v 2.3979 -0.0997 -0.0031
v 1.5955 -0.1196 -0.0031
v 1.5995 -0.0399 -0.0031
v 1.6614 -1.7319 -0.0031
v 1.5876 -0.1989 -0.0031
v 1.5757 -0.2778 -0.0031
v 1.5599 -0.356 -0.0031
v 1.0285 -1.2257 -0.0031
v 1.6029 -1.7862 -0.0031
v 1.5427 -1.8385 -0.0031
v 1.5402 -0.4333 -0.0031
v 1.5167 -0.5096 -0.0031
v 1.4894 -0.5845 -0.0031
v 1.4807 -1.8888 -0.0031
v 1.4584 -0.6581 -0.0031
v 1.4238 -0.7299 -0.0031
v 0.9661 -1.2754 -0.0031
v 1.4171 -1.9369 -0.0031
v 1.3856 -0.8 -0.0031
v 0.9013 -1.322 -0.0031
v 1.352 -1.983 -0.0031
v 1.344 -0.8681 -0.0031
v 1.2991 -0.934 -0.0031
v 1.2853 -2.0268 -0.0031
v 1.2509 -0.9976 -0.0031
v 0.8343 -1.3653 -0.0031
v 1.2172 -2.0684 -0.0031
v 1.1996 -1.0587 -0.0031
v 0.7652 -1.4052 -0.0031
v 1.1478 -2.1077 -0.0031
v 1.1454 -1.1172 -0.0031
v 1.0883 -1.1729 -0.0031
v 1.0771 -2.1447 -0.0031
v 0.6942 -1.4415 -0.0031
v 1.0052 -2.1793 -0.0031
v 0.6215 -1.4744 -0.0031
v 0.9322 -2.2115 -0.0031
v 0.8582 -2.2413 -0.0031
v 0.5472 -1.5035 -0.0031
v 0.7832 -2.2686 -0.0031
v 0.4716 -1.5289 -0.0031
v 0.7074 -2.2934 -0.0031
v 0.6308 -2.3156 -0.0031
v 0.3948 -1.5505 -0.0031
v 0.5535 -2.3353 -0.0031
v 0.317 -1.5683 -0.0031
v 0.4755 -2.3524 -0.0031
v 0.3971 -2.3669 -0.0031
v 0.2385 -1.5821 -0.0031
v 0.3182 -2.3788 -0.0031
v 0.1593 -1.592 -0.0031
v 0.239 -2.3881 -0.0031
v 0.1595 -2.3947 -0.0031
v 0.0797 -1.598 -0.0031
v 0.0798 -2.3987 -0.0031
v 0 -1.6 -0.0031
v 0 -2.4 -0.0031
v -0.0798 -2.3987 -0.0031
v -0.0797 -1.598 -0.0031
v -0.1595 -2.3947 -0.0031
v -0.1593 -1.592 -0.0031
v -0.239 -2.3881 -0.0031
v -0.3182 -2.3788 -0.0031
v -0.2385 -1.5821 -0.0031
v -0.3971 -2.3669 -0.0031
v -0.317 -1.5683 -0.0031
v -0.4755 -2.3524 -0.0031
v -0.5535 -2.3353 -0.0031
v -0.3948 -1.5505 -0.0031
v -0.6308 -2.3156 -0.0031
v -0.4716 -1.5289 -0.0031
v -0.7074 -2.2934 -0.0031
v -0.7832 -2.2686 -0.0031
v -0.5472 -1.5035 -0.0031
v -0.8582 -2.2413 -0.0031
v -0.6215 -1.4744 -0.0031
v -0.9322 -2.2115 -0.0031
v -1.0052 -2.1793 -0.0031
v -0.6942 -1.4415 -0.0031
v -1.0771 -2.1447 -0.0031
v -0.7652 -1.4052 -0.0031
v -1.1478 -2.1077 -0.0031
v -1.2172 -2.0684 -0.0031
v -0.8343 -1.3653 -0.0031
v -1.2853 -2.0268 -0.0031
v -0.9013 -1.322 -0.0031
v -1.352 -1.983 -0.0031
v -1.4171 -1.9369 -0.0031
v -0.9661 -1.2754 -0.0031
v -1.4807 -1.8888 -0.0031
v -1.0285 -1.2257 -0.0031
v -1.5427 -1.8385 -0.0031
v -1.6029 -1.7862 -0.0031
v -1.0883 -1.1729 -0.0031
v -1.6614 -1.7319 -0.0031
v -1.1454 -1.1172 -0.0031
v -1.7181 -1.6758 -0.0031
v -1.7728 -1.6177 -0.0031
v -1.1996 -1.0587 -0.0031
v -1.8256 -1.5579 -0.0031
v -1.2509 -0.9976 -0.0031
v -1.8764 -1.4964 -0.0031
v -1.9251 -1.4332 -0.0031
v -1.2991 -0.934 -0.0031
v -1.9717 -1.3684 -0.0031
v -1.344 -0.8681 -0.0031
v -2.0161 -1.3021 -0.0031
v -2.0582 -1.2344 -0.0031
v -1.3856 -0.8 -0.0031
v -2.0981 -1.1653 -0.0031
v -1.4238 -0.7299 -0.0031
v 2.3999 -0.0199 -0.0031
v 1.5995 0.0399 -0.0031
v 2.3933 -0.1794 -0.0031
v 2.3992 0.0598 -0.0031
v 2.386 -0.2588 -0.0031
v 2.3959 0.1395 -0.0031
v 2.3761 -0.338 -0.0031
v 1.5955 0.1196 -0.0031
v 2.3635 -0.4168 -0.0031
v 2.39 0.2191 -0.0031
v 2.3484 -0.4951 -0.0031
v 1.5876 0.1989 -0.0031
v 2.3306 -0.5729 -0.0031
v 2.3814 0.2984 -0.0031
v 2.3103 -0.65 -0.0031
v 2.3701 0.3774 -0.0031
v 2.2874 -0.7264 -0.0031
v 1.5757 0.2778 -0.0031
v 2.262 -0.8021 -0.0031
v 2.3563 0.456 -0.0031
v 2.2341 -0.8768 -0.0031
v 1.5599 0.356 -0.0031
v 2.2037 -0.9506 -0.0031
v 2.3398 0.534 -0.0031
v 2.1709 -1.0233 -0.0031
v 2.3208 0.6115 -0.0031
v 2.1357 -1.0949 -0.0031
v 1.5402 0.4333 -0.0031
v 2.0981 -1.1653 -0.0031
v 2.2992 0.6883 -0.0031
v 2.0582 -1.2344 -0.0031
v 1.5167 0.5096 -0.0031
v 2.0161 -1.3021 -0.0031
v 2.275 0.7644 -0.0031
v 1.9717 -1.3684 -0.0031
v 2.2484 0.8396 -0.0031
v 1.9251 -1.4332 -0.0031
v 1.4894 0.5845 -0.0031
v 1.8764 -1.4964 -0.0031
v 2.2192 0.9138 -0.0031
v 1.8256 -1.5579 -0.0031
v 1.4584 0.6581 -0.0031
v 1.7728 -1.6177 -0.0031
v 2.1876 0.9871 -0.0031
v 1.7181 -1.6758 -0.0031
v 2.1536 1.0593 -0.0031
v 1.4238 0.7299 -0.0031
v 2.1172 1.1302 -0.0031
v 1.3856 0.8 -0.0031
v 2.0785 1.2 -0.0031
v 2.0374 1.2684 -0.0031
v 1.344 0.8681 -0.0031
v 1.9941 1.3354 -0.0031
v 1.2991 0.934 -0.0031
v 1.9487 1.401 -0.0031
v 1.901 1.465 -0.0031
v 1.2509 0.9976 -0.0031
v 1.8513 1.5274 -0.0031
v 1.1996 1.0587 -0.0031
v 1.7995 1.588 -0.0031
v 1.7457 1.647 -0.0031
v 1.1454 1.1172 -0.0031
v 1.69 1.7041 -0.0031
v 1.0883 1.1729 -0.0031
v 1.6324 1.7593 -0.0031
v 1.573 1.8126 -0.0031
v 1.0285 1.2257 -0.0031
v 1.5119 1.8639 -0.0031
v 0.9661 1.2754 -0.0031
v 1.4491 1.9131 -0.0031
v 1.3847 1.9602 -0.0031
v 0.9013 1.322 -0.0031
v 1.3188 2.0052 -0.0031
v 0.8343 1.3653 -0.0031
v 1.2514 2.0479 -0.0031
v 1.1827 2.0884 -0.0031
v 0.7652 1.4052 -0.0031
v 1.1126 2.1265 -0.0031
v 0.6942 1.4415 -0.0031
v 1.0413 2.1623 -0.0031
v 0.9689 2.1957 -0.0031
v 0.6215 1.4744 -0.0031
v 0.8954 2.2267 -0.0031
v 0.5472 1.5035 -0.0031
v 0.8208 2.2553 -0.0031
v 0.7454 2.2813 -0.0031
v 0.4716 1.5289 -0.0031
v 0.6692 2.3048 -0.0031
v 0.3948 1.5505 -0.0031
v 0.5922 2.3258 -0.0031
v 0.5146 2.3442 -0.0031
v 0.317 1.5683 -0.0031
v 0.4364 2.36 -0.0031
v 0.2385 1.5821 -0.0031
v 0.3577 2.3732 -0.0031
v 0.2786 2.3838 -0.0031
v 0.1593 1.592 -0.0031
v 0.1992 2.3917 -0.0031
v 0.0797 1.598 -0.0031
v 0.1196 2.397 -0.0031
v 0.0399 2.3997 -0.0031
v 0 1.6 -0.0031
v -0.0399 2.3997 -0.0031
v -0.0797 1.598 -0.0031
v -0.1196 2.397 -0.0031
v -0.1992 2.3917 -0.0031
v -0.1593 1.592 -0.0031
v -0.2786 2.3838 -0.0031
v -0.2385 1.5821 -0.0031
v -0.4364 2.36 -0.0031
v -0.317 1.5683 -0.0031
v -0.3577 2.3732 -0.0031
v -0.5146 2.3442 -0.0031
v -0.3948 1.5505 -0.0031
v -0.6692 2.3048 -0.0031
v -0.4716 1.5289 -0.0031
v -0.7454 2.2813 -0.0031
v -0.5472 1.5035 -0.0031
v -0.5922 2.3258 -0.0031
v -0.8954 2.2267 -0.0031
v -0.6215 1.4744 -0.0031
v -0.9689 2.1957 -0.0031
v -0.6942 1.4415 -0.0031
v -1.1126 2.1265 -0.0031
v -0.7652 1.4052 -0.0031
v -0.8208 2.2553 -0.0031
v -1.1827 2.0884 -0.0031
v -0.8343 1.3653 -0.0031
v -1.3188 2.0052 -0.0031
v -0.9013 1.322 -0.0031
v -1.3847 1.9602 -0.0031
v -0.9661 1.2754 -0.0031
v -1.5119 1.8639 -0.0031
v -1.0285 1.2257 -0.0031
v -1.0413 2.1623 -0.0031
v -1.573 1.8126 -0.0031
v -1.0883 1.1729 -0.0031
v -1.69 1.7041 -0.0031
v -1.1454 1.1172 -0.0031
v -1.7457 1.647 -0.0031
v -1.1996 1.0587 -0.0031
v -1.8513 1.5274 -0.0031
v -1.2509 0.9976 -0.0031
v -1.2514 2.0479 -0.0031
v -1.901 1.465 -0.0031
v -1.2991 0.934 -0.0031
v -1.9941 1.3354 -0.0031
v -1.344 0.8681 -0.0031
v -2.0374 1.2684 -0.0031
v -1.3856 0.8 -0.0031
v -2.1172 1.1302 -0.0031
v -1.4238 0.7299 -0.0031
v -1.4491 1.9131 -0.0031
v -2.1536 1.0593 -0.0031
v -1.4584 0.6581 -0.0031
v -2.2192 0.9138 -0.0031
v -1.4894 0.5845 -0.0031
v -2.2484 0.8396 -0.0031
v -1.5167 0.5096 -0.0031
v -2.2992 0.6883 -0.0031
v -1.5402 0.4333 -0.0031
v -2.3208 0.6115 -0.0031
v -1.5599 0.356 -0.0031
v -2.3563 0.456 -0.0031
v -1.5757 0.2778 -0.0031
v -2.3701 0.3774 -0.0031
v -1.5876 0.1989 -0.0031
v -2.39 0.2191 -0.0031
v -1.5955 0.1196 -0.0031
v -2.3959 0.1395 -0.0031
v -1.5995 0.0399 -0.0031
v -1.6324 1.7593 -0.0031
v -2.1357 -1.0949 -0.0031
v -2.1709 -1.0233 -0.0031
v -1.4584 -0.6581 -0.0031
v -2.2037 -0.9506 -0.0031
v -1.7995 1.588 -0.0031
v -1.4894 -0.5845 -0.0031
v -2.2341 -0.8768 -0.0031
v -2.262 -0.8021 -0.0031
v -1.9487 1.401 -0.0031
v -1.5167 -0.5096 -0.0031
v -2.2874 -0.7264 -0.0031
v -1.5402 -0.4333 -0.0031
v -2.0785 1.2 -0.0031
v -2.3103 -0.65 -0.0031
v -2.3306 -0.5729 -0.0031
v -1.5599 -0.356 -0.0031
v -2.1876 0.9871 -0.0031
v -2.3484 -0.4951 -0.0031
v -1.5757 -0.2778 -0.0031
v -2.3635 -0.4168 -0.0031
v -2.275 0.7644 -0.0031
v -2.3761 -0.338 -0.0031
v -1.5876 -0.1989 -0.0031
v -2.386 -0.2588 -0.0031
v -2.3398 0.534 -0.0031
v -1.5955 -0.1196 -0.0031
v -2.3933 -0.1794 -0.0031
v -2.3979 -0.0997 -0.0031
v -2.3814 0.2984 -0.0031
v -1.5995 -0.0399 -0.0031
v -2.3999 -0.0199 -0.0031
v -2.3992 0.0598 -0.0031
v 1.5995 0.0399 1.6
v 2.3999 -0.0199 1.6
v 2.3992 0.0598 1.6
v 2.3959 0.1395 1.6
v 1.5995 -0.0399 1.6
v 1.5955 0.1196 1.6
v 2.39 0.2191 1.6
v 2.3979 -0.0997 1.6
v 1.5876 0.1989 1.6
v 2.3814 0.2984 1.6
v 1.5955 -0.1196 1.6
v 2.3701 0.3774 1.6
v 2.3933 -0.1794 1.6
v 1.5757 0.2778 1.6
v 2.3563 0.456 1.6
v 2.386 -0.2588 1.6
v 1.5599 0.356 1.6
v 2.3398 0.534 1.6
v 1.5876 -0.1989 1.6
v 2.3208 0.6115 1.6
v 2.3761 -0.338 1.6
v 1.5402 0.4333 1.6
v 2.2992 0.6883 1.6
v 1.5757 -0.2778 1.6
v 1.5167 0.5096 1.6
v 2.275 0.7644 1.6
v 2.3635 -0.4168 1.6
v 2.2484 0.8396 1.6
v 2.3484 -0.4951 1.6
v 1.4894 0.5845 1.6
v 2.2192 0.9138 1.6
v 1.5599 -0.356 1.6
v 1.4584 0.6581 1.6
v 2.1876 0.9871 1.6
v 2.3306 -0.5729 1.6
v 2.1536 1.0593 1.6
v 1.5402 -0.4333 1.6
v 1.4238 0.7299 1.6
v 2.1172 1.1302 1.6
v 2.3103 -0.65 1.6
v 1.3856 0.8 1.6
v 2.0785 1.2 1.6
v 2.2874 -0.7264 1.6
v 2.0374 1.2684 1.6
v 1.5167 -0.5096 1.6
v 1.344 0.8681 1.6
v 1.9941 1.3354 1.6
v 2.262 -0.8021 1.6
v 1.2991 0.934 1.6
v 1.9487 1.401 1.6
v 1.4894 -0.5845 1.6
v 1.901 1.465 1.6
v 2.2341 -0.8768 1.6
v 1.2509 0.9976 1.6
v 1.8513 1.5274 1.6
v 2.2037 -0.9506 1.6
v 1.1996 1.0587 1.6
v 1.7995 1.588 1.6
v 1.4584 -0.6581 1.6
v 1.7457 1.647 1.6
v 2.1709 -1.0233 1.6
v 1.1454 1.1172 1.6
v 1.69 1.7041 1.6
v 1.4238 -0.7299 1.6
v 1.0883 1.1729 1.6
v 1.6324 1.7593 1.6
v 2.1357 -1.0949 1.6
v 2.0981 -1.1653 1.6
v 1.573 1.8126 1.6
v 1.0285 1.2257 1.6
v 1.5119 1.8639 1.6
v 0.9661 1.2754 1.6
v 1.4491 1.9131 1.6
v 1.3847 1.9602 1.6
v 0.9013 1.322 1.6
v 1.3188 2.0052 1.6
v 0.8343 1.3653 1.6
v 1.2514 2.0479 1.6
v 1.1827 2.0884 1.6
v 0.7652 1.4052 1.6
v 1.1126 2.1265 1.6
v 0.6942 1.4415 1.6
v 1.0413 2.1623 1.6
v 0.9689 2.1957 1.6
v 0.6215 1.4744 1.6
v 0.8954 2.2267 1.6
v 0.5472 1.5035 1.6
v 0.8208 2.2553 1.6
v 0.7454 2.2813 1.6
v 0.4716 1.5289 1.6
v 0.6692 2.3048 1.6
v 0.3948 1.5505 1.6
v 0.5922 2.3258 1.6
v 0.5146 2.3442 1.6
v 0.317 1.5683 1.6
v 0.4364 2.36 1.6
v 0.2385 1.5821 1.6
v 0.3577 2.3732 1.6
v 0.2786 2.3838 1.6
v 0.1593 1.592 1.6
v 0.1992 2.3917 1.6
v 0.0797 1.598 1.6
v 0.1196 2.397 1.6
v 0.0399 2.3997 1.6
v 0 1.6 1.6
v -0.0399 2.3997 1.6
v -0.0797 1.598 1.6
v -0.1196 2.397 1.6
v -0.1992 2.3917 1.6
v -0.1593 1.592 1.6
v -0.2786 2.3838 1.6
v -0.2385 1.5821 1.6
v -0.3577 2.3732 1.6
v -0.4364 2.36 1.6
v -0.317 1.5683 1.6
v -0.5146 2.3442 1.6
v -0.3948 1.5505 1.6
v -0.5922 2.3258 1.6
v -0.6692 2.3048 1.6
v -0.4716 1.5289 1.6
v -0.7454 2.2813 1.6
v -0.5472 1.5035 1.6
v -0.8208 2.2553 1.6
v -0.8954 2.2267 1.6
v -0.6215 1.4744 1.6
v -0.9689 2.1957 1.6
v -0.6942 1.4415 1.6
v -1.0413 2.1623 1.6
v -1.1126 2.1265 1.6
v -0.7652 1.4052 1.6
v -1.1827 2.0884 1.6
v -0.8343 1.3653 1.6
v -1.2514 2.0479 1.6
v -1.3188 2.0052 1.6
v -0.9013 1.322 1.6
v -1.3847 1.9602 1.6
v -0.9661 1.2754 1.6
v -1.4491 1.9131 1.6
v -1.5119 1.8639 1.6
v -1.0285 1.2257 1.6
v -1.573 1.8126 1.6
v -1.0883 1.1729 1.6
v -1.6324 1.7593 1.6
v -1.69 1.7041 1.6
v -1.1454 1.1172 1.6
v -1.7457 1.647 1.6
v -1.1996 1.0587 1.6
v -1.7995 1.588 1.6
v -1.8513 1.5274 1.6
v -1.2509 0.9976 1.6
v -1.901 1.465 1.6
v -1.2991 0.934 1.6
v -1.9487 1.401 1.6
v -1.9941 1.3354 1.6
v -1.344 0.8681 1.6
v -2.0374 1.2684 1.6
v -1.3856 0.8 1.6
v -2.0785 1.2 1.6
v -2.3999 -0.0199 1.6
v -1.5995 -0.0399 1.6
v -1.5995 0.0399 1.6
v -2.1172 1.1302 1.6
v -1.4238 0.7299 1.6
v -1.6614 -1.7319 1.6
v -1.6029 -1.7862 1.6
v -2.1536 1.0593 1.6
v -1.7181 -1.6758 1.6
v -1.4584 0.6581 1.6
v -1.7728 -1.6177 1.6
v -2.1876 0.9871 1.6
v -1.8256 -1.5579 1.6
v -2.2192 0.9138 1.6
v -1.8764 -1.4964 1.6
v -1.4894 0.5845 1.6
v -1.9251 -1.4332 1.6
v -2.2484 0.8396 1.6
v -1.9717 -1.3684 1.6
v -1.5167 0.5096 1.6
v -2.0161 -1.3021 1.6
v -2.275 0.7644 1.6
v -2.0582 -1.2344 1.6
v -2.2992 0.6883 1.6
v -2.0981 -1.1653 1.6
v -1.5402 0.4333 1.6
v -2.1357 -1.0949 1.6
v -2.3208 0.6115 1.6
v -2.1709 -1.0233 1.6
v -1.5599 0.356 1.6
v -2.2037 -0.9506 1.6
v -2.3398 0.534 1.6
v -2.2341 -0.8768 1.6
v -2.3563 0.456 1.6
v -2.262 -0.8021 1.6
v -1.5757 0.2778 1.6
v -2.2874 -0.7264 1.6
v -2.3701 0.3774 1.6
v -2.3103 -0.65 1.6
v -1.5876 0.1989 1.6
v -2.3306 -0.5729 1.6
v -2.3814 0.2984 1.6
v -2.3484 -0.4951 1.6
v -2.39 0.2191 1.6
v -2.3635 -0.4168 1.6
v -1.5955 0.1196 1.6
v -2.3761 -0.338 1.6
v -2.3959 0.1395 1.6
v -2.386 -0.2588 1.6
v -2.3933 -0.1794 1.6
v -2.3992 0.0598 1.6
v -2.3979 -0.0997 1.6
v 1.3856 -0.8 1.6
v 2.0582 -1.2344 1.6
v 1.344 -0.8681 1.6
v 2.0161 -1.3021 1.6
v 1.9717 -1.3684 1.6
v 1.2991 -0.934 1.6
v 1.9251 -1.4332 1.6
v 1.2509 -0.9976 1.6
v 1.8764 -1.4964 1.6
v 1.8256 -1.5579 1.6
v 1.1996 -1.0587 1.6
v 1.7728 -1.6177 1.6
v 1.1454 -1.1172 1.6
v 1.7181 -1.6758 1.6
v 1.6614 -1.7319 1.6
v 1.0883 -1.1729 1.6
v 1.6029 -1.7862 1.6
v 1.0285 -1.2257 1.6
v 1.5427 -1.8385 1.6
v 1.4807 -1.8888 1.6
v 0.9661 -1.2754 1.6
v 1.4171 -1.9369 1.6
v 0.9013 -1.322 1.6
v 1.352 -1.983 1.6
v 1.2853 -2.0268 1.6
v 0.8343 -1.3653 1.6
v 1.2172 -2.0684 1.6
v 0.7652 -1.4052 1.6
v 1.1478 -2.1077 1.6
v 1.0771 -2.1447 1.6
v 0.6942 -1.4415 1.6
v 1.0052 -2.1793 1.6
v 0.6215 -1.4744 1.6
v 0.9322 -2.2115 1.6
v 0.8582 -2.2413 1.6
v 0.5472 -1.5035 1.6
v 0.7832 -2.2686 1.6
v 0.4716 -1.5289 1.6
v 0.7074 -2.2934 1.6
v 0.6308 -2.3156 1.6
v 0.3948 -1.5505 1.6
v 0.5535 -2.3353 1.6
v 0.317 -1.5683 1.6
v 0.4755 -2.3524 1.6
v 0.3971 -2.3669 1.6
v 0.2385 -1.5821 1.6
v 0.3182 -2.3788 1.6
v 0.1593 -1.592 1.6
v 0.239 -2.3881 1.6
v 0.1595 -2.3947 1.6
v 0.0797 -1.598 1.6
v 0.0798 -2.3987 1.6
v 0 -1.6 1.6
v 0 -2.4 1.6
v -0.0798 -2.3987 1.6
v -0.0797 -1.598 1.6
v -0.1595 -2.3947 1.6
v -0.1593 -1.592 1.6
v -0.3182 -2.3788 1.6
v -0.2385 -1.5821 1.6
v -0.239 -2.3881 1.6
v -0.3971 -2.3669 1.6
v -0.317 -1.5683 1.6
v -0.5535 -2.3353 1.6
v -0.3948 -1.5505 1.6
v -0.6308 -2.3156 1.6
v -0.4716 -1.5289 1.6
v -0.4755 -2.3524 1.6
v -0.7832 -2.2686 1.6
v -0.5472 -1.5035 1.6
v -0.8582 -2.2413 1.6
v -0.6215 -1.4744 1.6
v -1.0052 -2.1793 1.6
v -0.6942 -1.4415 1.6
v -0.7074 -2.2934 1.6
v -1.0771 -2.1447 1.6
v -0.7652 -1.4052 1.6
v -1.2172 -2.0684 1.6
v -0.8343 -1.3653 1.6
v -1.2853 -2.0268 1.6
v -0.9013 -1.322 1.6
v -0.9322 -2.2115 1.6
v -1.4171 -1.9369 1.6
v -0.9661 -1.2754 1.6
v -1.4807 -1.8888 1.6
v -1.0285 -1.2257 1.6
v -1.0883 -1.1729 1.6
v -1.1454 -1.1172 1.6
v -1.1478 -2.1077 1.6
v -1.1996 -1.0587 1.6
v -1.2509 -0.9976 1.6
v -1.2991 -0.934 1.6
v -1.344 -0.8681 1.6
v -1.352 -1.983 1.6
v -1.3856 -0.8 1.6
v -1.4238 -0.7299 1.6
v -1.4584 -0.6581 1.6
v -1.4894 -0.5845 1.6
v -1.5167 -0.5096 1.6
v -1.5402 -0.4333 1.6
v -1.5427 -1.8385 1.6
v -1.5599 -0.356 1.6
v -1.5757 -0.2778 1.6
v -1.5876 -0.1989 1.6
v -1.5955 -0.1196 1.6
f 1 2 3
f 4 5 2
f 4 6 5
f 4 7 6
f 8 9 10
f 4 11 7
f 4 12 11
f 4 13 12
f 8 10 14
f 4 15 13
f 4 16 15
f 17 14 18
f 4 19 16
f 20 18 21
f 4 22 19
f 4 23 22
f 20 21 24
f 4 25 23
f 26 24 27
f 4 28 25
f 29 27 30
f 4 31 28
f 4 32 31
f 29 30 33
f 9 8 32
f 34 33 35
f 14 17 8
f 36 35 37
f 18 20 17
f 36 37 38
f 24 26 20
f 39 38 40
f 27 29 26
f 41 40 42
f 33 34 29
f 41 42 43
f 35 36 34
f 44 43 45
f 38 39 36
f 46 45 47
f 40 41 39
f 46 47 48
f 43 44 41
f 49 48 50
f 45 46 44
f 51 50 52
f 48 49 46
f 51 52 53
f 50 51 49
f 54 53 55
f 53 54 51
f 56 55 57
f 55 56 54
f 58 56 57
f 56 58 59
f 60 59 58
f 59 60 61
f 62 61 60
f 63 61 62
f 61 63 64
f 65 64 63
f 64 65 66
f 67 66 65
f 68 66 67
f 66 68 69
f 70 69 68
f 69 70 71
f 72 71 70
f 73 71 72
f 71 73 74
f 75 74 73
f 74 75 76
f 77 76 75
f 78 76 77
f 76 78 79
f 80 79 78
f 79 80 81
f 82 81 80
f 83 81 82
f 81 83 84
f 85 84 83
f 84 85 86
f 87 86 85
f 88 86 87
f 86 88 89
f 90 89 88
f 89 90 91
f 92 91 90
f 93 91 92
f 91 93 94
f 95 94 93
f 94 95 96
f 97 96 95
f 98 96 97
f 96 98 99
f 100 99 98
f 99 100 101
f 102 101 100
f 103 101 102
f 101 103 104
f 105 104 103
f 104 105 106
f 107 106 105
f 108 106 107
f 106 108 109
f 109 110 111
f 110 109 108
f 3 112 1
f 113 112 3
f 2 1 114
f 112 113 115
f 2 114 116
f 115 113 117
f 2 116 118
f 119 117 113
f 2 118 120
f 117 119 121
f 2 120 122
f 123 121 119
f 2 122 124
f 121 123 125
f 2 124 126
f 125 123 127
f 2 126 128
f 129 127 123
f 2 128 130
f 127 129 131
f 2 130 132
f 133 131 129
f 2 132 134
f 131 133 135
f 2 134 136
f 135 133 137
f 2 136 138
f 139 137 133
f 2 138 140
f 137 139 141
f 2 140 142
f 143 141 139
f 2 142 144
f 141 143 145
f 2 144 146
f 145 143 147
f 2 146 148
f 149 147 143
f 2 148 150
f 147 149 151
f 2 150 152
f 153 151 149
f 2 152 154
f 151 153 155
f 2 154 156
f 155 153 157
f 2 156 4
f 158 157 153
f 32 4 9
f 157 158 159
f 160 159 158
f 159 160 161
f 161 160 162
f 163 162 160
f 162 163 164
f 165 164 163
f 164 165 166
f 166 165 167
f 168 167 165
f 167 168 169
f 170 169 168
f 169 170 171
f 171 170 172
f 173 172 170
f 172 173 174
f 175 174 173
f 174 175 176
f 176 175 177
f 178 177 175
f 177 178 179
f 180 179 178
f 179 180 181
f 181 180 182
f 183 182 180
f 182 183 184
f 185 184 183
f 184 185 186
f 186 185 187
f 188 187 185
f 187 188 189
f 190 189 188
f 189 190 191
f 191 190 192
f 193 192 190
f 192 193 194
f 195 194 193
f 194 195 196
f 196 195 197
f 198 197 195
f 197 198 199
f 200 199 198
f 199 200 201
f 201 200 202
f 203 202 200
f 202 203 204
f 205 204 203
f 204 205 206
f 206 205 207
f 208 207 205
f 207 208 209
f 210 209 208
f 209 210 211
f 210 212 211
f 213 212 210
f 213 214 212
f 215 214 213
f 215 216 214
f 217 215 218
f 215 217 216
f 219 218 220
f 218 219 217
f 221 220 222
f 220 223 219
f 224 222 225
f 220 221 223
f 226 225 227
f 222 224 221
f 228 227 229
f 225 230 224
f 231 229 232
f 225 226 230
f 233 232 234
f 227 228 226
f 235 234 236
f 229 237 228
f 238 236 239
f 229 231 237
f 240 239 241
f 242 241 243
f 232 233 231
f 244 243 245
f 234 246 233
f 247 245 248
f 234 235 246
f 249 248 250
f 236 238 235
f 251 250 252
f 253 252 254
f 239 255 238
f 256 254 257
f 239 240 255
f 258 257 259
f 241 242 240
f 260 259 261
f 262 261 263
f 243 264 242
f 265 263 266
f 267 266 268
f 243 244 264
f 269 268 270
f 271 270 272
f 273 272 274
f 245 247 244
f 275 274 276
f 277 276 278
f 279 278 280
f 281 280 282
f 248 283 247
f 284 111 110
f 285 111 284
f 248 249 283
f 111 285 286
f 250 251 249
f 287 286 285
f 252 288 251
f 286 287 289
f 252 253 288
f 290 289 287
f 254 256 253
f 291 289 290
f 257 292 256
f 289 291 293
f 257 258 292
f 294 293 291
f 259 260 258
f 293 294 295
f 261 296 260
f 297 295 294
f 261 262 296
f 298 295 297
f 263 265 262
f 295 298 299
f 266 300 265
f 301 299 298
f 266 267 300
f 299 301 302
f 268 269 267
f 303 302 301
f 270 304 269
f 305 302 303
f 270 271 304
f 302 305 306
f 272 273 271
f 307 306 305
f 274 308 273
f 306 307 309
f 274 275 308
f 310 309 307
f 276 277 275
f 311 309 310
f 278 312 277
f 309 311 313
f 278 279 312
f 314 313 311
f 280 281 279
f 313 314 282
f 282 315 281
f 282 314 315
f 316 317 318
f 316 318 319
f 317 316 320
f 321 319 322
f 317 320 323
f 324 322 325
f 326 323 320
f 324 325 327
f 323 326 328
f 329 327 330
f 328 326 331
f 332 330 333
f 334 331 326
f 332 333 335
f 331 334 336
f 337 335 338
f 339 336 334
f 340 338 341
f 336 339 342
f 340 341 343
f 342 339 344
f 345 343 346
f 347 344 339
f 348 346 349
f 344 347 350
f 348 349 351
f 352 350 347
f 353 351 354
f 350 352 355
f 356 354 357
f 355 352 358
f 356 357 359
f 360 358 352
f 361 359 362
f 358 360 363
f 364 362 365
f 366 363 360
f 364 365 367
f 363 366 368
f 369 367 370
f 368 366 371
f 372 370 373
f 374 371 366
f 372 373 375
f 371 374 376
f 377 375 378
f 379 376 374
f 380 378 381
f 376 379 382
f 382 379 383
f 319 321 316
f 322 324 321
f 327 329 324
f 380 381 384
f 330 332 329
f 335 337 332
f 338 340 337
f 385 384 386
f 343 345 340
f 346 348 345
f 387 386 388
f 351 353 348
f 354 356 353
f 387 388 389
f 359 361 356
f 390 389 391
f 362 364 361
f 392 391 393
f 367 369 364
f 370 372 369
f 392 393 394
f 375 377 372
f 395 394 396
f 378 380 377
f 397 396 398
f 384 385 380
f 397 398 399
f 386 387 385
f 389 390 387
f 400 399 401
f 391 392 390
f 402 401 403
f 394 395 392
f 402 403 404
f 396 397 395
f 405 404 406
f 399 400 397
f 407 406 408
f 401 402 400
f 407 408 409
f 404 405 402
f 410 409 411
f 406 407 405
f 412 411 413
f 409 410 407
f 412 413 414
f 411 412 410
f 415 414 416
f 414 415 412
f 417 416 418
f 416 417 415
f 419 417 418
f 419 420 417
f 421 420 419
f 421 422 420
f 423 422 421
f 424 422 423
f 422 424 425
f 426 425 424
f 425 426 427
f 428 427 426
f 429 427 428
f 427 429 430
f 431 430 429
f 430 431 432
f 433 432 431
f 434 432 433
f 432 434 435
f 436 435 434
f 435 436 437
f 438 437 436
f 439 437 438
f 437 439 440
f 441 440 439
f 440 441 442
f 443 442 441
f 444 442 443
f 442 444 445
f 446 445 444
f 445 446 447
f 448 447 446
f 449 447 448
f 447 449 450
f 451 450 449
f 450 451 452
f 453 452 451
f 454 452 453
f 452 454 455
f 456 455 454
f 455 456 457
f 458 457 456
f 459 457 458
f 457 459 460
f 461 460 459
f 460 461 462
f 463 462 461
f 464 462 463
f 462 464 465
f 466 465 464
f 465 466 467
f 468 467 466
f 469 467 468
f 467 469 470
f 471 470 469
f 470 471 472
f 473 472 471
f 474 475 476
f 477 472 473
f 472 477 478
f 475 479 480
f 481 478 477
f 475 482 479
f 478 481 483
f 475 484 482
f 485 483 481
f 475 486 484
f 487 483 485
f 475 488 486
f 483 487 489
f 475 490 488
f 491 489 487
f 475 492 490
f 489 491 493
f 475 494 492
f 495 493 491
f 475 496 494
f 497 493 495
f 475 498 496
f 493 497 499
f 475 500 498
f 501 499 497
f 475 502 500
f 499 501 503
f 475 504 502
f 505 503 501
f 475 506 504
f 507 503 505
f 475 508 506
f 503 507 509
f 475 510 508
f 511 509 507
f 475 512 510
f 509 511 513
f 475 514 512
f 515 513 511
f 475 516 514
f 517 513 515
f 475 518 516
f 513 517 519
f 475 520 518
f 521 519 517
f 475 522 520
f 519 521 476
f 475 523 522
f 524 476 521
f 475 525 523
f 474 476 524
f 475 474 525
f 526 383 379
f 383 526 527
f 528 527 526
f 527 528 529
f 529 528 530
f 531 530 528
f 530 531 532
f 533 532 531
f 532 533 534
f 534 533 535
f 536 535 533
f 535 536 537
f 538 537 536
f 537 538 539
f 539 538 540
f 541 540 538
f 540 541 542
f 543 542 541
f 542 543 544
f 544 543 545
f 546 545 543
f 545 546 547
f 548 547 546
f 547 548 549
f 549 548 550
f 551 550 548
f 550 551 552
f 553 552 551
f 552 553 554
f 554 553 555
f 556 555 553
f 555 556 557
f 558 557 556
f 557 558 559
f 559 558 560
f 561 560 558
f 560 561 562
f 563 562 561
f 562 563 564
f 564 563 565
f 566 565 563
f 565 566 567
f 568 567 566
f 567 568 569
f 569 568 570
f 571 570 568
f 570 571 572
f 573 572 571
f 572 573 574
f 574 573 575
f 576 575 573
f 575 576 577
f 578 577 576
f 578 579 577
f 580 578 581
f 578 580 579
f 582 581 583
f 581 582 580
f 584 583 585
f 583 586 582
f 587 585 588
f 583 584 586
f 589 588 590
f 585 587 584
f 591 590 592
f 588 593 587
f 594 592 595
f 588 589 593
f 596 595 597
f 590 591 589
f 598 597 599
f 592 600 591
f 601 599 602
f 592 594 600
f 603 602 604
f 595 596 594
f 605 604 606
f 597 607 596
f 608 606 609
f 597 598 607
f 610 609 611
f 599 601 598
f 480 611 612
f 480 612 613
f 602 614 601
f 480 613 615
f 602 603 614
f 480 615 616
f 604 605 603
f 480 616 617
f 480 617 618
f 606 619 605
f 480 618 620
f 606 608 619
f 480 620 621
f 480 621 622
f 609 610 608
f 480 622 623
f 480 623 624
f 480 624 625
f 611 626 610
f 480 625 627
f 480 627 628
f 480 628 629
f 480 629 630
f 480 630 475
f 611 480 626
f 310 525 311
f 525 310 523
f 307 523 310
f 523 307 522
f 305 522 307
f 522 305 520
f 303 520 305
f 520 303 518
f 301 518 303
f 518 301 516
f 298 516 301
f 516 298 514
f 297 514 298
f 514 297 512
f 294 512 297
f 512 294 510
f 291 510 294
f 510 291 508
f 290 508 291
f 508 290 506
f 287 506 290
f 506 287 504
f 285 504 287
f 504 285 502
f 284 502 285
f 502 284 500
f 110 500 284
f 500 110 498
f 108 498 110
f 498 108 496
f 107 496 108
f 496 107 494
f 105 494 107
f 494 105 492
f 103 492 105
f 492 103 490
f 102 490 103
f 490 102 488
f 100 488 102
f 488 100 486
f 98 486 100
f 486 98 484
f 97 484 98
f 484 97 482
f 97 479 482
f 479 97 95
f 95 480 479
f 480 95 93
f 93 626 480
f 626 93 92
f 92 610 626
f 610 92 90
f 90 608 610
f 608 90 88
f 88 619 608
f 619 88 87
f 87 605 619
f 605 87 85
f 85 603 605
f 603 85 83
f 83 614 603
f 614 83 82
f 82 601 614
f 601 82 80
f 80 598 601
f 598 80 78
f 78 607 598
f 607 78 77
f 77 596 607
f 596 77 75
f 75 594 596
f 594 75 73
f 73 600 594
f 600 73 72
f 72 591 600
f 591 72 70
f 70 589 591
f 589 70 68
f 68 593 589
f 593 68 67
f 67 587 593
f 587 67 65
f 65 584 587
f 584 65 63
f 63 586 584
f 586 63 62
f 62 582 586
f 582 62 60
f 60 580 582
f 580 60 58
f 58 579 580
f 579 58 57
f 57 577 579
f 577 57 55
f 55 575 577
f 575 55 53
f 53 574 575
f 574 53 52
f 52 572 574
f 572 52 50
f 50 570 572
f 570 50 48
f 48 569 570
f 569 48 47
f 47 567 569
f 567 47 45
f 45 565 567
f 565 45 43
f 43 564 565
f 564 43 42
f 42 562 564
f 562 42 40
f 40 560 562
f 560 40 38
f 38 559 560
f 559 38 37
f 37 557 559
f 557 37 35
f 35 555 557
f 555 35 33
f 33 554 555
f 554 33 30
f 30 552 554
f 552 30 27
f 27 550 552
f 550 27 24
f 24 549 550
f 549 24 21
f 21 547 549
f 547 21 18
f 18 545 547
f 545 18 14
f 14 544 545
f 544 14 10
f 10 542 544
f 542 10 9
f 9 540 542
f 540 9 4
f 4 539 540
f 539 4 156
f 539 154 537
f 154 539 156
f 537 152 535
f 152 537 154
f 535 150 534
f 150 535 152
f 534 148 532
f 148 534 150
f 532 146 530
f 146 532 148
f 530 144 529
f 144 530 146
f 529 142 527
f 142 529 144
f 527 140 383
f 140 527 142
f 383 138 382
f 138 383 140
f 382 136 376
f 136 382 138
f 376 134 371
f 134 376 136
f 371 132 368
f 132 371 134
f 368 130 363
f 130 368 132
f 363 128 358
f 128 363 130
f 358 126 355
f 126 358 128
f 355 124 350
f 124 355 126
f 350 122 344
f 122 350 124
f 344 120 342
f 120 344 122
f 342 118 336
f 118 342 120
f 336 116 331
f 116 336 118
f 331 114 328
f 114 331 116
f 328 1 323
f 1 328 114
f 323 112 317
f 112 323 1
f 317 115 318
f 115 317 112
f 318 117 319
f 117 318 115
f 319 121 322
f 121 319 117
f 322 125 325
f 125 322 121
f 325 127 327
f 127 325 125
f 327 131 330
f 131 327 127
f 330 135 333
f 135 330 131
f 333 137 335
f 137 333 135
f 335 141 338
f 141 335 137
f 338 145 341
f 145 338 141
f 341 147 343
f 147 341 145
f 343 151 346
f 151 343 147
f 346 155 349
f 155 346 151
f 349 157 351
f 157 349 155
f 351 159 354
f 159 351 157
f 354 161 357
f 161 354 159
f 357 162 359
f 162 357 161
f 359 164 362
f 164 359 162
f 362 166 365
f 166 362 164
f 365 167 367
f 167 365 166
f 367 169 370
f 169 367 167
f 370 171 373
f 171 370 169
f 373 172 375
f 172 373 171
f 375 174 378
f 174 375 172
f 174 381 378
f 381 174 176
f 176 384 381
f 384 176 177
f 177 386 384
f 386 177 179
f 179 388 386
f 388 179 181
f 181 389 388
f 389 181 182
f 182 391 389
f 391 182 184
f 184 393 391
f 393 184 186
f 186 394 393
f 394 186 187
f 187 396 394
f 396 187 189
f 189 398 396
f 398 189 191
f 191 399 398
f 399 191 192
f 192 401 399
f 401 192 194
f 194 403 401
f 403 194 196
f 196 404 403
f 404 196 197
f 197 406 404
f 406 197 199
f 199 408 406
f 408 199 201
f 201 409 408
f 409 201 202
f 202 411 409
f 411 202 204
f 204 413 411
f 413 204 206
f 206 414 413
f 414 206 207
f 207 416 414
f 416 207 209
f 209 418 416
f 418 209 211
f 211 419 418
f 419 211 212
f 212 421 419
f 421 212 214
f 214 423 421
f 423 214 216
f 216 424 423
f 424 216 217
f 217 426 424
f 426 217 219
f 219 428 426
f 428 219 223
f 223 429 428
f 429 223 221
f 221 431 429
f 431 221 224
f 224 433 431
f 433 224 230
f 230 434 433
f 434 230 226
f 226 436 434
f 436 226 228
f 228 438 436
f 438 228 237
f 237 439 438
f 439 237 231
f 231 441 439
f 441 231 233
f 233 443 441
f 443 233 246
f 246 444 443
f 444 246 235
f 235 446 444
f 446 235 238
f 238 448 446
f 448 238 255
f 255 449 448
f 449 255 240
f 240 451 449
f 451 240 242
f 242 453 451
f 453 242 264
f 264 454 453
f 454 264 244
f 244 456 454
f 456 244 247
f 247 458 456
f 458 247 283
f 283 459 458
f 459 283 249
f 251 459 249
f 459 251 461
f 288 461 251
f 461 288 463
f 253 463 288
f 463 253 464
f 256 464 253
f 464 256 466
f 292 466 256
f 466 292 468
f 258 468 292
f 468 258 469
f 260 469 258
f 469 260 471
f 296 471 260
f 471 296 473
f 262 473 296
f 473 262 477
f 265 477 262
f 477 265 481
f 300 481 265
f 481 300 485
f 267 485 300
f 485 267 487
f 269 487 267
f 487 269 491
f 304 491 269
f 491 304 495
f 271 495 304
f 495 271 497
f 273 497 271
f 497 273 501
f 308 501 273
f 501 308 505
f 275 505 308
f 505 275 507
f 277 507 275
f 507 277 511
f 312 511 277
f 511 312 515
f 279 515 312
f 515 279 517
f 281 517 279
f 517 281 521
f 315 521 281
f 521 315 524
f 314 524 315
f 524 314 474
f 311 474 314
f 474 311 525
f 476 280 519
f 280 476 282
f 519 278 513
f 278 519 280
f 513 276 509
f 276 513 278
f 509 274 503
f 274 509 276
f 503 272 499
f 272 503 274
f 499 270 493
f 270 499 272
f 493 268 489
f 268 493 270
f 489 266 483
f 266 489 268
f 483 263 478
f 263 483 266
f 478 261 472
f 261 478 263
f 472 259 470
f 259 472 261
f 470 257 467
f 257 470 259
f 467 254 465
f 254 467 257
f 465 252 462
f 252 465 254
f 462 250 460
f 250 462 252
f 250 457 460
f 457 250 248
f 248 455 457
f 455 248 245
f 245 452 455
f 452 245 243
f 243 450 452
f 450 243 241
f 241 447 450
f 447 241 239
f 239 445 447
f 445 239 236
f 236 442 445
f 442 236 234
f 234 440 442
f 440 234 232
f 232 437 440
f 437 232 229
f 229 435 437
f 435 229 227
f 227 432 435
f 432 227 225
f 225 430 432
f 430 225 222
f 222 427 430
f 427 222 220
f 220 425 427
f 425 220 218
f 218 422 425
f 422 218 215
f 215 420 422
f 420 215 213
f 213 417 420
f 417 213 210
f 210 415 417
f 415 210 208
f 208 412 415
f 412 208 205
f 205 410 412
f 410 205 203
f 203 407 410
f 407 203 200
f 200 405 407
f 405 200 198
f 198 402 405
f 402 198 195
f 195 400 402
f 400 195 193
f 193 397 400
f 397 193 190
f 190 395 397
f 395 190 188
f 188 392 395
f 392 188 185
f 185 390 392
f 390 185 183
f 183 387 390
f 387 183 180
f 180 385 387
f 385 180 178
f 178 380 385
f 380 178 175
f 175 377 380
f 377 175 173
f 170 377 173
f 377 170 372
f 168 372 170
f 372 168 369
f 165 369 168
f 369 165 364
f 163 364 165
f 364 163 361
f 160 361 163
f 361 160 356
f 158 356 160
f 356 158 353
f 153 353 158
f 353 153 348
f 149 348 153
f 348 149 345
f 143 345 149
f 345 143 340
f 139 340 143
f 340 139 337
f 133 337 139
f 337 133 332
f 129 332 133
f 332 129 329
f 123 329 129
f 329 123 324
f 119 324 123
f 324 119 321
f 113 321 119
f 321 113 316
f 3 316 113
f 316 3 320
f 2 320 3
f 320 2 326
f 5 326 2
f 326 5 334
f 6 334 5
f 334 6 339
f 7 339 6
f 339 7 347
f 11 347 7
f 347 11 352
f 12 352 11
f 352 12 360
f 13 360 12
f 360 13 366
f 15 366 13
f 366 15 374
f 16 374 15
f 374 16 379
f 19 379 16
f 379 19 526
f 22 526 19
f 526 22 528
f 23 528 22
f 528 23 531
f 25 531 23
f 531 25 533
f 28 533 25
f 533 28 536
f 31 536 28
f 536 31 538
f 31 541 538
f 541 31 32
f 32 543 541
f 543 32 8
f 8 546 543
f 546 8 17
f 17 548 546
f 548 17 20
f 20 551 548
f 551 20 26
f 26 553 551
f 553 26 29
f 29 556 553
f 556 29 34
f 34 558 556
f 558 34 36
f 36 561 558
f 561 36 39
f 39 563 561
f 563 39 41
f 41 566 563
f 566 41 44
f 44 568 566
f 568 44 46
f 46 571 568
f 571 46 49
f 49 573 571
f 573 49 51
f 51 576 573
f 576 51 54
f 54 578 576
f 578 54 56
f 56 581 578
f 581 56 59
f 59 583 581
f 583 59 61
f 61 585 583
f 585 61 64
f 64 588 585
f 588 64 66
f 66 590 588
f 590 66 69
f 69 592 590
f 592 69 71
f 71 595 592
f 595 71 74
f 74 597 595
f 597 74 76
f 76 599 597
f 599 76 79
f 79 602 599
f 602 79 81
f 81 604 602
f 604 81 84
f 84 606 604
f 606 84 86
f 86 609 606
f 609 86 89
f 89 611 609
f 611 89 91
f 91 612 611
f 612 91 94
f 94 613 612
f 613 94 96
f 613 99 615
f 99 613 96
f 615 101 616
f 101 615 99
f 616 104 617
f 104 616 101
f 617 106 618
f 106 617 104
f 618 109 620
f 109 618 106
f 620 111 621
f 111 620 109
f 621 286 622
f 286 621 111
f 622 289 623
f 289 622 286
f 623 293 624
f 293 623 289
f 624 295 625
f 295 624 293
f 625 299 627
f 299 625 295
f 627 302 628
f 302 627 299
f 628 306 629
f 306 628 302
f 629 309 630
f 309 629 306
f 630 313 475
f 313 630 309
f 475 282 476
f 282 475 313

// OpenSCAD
use <../lib.scad>
use <193445c.scad>
use <4182.scad>
$fa=1; $fs=0.2;
function ldraw_lib__4182dt1(realsolid=false) = [
// 0 Train Door  1 x  4 x  5 Right with "5590" Sticker
// 0 Name: 4182dt1.dat
// 0 Author: Ulrich Röder [UR]
// 0 !LDRAW_ORG Shortcut UPDATE 2019-01
// 0 !LICENSE Licensed under CC BY 2.0 and CC BY 4.0 : see CAreadme.txt
// 
// 0 BFC CERTIFY CCW
  [0,"BFC","CERTIFY"],
  [0,"BFC","CCW"],
// 
// 0 !KEYWORDS Set 5590
// 
// 0 !HISTORY 2019-06-28 [PTadmin] Official Update 2019-01
// 
// 
// 1 16 0 0 0 1 0 0 0 1 0 0 0 1 4182.dat
  [1,16,0,0,0,1,0,0,0,1,0,0,0,1, ldraw_lib__4182(realsolid)],
// 1 16 -10.5 102 30 0 1 0 0 0 -1 -1 0 0 193445c.dat
  [1,16,-10.5,102,30,0,1,0,0,0,-1,-1,0,0, ldraw_lib__193445c(realsolid)],
];
module ldraw_lib__4182dt1(step=0, col=false, unit=2/5, alt=false, line=0.2, solid=!$preview)
    makepoly(ldraw_lib__4182dt1(solid), step=step, col=col, unit=unit, alt=alt, line=line, solid=solid);
ldraw_lib__4182dt1(line=0.2);
